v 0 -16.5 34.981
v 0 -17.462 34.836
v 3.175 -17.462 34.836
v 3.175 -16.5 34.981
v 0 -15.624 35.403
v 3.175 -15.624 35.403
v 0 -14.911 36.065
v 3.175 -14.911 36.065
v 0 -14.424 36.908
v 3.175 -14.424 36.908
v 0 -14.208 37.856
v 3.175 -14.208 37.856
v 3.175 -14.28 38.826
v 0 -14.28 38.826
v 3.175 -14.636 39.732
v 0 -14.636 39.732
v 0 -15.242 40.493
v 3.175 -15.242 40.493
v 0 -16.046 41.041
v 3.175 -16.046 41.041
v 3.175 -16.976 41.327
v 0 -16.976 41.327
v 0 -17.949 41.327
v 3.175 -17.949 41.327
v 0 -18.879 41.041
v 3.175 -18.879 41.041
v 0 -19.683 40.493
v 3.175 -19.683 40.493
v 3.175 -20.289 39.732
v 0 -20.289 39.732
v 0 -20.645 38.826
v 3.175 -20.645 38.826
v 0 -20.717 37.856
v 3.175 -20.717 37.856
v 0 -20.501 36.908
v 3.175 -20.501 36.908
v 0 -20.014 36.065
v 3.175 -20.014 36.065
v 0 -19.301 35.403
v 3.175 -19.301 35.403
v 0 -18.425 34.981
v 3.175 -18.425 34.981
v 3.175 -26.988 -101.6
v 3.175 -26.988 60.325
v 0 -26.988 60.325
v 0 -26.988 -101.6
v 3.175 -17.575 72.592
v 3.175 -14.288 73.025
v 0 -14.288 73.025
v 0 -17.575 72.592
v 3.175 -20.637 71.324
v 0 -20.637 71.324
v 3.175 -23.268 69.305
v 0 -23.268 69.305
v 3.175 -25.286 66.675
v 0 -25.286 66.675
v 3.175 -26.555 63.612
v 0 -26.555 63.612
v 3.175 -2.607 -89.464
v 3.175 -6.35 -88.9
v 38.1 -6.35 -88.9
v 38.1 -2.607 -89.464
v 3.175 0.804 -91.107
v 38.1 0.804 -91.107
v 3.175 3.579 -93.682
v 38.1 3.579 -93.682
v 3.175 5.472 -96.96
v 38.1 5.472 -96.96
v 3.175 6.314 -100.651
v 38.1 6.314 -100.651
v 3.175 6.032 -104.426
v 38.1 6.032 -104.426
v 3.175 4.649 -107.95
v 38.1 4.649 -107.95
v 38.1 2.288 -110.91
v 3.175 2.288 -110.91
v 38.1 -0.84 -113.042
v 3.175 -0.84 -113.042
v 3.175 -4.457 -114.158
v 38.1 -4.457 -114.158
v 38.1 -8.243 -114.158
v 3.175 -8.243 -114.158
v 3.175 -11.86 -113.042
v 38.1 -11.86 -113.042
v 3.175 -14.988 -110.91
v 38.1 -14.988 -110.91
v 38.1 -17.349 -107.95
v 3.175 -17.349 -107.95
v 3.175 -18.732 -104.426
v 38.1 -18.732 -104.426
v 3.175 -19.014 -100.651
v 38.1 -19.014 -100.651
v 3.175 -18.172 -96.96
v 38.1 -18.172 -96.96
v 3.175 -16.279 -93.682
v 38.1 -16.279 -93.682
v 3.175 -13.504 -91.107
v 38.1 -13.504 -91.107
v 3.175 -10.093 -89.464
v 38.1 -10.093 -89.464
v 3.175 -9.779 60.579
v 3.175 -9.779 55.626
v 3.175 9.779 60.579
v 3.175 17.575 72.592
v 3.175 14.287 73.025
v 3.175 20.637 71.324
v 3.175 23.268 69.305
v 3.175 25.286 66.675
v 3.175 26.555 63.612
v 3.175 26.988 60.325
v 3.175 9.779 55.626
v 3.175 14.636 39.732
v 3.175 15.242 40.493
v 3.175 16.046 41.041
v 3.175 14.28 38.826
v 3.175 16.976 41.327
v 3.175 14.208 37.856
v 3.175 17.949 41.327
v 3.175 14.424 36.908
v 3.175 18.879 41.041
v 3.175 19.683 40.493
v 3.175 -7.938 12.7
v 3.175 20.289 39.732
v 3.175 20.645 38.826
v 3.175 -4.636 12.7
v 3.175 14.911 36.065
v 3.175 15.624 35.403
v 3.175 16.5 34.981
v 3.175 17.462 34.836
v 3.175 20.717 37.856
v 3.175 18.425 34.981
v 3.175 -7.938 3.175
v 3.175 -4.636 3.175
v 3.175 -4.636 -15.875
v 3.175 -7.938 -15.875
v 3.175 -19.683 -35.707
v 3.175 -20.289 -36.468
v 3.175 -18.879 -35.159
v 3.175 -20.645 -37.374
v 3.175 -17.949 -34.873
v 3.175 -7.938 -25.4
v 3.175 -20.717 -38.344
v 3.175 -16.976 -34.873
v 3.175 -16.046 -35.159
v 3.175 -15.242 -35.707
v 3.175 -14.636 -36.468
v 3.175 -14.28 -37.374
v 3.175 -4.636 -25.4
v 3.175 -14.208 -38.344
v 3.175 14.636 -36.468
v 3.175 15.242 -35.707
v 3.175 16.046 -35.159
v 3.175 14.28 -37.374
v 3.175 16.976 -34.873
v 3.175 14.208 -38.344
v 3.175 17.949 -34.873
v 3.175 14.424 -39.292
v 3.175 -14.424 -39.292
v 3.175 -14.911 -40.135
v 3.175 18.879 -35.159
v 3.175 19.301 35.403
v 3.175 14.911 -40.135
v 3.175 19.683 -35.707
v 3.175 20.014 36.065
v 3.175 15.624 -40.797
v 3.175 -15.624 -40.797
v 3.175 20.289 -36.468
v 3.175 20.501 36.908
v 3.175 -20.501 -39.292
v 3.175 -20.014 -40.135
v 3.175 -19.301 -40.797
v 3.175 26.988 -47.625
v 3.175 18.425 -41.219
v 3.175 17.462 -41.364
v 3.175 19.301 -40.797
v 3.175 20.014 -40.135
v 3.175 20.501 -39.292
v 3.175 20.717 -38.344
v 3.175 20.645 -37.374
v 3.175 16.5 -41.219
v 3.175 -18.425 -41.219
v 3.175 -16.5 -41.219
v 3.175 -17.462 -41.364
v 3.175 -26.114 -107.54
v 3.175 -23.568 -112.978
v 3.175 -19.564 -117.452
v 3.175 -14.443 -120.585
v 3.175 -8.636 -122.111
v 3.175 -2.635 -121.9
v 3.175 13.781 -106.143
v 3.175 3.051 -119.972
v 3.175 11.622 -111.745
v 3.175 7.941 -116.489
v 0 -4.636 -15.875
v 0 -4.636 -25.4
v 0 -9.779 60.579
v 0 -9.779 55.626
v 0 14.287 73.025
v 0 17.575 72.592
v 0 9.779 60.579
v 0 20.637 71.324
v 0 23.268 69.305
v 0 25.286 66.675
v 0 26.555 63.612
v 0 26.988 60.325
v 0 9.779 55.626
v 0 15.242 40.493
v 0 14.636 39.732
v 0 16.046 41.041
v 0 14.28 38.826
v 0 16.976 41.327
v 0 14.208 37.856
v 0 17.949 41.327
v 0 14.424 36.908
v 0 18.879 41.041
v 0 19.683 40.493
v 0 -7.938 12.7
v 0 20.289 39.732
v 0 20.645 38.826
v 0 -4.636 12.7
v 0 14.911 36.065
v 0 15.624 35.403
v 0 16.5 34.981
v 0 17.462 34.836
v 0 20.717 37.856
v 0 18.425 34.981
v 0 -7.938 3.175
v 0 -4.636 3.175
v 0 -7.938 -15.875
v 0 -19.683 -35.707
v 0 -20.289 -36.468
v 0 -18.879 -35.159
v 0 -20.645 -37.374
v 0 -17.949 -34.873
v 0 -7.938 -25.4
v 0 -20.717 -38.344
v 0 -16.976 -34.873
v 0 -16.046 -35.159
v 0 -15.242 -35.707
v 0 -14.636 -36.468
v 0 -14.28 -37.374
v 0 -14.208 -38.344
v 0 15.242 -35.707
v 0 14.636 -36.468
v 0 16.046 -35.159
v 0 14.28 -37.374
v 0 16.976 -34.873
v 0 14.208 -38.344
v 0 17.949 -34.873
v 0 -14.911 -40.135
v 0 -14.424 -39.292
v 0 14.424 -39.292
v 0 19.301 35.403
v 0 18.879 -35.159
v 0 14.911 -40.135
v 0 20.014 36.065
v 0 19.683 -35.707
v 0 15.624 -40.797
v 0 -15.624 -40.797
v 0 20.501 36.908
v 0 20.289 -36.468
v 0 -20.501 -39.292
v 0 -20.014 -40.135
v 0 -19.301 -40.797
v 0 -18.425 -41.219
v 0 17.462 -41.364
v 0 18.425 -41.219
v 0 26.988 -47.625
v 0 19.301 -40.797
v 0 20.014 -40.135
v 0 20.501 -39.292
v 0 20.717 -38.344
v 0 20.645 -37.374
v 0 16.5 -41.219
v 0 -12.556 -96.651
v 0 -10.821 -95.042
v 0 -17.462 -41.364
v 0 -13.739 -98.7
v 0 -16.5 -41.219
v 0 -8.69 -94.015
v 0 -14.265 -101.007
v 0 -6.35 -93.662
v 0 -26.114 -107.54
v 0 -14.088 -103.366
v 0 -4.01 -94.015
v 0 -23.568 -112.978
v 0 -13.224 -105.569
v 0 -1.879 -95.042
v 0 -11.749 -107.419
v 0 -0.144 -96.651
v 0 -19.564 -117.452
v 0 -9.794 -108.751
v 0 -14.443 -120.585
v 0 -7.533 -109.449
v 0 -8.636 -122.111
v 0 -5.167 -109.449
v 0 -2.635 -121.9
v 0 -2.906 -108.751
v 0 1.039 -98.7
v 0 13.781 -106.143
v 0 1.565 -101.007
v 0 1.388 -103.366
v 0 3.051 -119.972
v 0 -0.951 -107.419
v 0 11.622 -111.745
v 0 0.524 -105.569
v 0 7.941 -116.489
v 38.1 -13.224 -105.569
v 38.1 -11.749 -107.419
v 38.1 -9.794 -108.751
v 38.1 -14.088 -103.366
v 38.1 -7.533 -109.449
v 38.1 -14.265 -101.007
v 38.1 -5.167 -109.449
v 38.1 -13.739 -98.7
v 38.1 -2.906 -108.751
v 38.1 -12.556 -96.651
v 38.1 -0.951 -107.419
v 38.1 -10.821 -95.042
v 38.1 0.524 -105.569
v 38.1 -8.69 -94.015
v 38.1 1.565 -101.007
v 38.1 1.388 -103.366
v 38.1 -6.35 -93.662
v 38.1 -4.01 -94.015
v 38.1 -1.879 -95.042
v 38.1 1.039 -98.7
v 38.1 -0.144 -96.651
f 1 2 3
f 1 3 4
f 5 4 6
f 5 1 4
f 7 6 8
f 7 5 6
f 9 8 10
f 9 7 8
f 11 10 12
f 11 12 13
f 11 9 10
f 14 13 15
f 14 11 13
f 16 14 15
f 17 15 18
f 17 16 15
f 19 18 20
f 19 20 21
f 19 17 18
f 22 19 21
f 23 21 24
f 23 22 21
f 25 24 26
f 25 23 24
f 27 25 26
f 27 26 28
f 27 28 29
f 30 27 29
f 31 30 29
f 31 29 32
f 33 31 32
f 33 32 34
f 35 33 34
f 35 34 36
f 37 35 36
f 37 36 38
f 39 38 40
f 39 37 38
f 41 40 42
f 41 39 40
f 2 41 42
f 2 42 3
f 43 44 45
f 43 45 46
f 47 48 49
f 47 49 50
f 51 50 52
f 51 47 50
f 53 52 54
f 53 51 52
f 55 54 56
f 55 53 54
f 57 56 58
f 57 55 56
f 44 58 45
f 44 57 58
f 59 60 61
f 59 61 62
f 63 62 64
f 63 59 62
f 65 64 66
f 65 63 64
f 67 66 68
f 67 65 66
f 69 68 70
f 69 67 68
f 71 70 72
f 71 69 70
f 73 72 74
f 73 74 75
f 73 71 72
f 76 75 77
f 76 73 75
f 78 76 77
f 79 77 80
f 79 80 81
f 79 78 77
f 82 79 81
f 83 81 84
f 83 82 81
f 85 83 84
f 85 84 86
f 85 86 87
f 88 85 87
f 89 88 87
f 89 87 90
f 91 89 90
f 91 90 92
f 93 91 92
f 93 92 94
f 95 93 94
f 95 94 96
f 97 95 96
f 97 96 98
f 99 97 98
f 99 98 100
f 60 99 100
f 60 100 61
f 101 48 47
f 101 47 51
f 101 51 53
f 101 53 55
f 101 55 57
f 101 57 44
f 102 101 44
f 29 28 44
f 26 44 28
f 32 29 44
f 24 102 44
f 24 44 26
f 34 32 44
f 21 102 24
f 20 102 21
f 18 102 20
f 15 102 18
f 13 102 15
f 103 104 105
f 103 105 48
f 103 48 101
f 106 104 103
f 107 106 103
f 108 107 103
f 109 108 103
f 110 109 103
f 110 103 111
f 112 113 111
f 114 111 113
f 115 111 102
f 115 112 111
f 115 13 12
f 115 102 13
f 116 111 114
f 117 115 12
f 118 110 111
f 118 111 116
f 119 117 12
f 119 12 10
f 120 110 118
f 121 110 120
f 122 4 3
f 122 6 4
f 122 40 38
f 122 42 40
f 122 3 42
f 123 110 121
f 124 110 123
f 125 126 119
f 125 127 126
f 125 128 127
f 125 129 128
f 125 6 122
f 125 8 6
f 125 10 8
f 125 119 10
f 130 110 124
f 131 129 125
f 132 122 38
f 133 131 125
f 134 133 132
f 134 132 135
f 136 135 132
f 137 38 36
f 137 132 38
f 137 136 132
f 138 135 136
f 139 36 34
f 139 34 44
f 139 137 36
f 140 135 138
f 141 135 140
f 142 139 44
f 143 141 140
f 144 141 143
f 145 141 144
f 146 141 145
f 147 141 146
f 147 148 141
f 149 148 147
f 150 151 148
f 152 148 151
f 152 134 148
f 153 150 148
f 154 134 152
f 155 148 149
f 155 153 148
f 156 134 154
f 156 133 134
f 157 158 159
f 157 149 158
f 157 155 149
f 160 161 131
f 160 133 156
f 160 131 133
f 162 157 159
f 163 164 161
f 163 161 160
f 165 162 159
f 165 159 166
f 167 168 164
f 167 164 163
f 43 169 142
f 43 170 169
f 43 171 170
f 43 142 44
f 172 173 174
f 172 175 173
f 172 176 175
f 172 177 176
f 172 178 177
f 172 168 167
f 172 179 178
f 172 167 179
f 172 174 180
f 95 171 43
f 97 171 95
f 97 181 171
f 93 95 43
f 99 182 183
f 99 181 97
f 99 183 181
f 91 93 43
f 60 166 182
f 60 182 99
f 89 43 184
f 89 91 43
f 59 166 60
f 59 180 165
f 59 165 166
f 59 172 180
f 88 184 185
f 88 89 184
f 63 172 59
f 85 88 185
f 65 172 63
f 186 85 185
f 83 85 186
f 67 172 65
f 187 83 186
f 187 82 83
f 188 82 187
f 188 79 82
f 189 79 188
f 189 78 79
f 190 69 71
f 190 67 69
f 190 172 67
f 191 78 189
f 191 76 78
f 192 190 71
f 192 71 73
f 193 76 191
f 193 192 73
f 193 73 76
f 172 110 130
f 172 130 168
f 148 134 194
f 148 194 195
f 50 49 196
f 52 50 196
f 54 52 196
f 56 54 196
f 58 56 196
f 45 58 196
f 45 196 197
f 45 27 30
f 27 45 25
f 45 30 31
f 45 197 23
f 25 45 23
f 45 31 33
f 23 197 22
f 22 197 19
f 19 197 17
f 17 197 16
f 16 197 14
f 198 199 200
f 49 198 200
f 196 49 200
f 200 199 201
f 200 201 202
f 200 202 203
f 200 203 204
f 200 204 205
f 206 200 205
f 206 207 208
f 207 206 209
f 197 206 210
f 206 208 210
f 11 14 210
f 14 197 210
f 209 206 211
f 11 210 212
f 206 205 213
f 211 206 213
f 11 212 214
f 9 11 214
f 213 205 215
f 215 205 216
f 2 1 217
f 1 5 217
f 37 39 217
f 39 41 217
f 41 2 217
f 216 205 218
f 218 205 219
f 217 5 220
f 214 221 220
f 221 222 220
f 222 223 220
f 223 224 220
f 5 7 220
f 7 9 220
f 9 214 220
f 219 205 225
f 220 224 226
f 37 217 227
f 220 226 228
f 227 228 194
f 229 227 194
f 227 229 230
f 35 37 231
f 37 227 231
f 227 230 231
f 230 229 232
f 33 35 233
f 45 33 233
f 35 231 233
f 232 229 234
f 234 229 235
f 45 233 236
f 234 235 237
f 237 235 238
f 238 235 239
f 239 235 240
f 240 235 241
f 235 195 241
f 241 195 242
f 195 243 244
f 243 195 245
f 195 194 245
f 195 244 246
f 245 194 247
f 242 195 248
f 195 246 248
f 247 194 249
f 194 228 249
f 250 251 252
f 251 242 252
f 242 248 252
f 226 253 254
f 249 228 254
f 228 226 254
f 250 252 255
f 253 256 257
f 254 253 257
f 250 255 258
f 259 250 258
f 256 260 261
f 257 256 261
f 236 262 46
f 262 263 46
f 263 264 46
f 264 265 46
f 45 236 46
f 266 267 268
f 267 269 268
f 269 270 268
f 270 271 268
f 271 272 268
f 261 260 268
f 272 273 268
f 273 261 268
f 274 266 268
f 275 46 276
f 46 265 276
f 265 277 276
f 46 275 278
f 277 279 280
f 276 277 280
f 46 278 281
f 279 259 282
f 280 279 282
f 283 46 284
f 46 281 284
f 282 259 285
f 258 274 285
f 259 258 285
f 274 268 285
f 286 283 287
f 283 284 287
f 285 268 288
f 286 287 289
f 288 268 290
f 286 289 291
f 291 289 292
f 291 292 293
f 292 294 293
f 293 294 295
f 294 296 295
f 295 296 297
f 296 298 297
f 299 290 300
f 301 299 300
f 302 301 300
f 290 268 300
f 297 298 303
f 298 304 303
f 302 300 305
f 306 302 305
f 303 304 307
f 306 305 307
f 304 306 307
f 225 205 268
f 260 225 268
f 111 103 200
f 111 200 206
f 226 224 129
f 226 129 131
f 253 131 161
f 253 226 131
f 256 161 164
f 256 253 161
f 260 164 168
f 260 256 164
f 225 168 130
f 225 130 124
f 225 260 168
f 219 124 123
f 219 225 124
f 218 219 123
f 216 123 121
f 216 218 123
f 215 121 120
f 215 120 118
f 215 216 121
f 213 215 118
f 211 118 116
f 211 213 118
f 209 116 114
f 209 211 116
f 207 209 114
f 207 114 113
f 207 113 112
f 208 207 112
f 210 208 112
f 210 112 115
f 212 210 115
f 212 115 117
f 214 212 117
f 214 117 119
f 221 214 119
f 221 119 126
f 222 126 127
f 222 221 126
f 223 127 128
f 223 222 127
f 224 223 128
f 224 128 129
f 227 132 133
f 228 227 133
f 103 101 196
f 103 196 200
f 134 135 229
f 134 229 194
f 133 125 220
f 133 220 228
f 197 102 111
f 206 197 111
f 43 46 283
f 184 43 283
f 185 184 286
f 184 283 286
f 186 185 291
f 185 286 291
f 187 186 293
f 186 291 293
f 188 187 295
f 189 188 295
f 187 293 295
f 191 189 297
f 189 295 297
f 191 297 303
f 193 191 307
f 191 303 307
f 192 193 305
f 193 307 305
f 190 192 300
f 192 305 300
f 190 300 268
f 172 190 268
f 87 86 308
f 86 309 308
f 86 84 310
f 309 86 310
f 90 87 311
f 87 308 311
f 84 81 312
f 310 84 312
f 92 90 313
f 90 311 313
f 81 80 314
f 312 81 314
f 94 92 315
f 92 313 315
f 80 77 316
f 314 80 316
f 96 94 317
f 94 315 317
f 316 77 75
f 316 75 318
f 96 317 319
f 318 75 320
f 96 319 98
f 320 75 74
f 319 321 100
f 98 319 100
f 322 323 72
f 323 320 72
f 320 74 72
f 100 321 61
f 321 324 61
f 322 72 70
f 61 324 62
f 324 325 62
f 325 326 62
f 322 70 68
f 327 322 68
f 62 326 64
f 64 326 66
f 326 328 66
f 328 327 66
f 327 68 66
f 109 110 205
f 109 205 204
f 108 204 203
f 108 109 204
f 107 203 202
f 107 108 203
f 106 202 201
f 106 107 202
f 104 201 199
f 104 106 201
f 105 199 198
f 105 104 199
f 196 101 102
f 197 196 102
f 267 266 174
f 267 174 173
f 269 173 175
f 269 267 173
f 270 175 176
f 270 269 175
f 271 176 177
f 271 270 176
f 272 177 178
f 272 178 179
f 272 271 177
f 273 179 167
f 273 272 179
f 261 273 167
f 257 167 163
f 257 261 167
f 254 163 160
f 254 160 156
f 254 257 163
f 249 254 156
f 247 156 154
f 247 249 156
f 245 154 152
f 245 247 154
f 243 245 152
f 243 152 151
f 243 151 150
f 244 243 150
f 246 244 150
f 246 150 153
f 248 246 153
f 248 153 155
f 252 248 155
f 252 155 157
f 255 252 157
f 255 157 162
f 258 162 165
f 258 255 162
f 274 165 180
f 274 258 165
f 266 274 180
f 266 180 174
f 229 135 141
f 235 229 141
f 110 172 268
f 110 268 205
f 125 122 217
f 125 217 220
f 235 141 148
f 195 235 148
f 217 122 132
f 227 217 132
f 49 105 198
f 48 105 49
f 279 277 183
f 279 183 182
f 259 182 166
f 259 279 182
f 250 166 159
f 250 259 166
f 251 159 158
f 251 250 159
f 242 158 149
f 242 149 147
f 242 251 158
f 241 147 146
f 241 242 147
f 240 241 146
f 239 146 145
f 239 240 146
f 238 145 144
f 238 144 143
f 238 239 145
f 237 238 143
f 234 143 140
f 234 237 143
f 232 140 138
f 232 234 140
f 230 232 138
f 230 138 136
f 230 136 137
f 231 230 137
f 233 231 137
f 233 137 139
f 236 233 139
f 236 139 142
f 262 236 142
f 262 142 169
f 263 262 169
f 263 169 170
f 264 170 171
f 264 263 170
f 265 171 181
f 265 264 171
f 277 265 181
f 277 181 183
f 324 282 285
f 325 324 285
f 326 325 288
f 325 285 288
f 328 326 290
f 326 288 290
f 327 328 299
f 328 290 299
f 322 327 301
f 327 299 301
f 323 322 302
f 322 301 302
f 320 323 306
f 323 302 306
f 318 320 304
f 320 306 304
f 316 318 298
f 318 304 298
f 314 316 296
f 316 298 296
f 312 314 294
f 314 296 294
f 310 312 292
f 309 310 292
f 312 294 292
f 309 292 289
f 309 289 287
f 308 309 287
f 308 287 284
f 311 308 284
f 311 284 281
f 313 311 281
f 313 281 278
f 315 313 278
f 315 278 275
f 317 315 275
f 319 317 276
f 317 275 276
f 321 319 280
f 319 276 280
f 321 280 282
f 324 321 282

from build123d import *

# Parameters (mm, degrees)
SKETCH1_R           = 3.2639
SKETCH1_R_2         = 12.7
BOSS_EXTRUDE1_DEPTH = 3.175
SKETCH2_R           = 12.7
SKETCH2_R_2         = 7.9375
BOSS_EXTRUDE2_DEPTH = 38.1
SKETCH4_W           = 4.953
SKETCH4_H           = 19.558
BOSS_EXTRUDE3_DEPTH = 3.175
SKETCH5_W           = 9.525
SKETCH5_H           = 3.302
CUT_EXTRUDE1_DEPTH  = 4.175


with BuildPart() as part:
    # Sketch1 → Boss-Extrude1 (new body)
    with BuildSketch(Plane(origin=(0, 0, 0), x_dir=(0, 0, -1), z_dir=(1, 0, 0))):
        with BuildLine():
            Line((106.143178695, 13.781217887), (47.625, 26.9875))
            Line((47.625, 26.9875), (-47.625, 26.9875))
            Line((-47.625, 26.9875), (-47.625, -26.9875))
            Line((-47.625, -26.9875), (101.6, -26.9875))
            ThreePointArc((101.6, -26.9875), (122.110538942, -8.635650576), (106.143178695, 13.781217887))
        make_face()
        with Locations((38.1, 17.4625)):
            Circle(SKETCH1_R, mode=Mode.SUBTRACT)
        with Locations((38.1, -17.4625)):
            Circle(SKETCH1_R, mode=Mode.SUBTRACT)
        with Locations((-38.1, -17.4625)):
            Circle(SKETCH1_R, mode=Mode.SUBTRACT)
        with Locations((-38.1, 17.4625)):
            Circle(SKETCH1_R, mode=Mode.SUBTRACT)
        with Locations((101.6, -6.35)):
            Circle(SKETCH1_R_2, mode=Mode.SUBTRACT)
    extrude(amount=BOSS_EXTRUDE1_DEPTH)

    # Sketch2 → Boss-Extrude2 (add)
    with BuildSketch(Plane.ZY):
        with Locations((-101.6, -6.35)):
            Circle(SKETCH2_R)
        with Locations((-101.6, -6.35)):
            Circle(SKETCH2_R_2, mode=Mode.SUBTRACT)
    extrude(amount=-BOSS_EXTRUDE2_DEPTH)

    # Sketch4 → Boss-Extrude3 (add)
    with BuildSketch(Plane(origin=(3.175, 0, 0), x_dir=(0, 0, -1), z_dir=(1, 0, 0))):
        with BuildLine():
            Line((-47.625, 26.9875), (-60.325, 26.9875))
            ThreePointArc((-60.325, 26.9875), (-69.305256121, 23.267756121), (-73.025, 14.2875))
            Line((-73.025, 14.2875), (-73.025, -14.2875))
            ThreePointArc((-73.025, -14.2875), (-69.305256121, -23.267756121), (-60.325, -26.9875))
            Line((-60.325, -26.9875), (-47.625, -26.9875))
            Line((-47.625, -26.9875), (-47.625, 26.9875))
        make_face()
        with Locations((-58.1025, 0)):
            Rectangle(SKETCH4_W, SKETCH4_H, mode=Mode.SUBTRACT)
    extrude(amount=-BOSS_EXTRUDE3_DEPTH)

    # Sketch5 → Cut-Extrude1 (cut, through all)
    with BuildSketch(Plane(origin=(3.175, 0, 0), x_dir=(0, 0, -1), z_dir=(1, 0, 0))):
        with Locations((20.6375, -6.2865)):
            Rectangle(SKETCH5_W, SKETCH5_H)
        with Locations((-7.9375, -6.2865)):
            Rectangle(SKETCH5_W, SKETCH5_H)
    extrude(amount=-CUT_EXTRUDE1_DEPTH, mode=Mode.SUBTRACT)


solid = part.part
